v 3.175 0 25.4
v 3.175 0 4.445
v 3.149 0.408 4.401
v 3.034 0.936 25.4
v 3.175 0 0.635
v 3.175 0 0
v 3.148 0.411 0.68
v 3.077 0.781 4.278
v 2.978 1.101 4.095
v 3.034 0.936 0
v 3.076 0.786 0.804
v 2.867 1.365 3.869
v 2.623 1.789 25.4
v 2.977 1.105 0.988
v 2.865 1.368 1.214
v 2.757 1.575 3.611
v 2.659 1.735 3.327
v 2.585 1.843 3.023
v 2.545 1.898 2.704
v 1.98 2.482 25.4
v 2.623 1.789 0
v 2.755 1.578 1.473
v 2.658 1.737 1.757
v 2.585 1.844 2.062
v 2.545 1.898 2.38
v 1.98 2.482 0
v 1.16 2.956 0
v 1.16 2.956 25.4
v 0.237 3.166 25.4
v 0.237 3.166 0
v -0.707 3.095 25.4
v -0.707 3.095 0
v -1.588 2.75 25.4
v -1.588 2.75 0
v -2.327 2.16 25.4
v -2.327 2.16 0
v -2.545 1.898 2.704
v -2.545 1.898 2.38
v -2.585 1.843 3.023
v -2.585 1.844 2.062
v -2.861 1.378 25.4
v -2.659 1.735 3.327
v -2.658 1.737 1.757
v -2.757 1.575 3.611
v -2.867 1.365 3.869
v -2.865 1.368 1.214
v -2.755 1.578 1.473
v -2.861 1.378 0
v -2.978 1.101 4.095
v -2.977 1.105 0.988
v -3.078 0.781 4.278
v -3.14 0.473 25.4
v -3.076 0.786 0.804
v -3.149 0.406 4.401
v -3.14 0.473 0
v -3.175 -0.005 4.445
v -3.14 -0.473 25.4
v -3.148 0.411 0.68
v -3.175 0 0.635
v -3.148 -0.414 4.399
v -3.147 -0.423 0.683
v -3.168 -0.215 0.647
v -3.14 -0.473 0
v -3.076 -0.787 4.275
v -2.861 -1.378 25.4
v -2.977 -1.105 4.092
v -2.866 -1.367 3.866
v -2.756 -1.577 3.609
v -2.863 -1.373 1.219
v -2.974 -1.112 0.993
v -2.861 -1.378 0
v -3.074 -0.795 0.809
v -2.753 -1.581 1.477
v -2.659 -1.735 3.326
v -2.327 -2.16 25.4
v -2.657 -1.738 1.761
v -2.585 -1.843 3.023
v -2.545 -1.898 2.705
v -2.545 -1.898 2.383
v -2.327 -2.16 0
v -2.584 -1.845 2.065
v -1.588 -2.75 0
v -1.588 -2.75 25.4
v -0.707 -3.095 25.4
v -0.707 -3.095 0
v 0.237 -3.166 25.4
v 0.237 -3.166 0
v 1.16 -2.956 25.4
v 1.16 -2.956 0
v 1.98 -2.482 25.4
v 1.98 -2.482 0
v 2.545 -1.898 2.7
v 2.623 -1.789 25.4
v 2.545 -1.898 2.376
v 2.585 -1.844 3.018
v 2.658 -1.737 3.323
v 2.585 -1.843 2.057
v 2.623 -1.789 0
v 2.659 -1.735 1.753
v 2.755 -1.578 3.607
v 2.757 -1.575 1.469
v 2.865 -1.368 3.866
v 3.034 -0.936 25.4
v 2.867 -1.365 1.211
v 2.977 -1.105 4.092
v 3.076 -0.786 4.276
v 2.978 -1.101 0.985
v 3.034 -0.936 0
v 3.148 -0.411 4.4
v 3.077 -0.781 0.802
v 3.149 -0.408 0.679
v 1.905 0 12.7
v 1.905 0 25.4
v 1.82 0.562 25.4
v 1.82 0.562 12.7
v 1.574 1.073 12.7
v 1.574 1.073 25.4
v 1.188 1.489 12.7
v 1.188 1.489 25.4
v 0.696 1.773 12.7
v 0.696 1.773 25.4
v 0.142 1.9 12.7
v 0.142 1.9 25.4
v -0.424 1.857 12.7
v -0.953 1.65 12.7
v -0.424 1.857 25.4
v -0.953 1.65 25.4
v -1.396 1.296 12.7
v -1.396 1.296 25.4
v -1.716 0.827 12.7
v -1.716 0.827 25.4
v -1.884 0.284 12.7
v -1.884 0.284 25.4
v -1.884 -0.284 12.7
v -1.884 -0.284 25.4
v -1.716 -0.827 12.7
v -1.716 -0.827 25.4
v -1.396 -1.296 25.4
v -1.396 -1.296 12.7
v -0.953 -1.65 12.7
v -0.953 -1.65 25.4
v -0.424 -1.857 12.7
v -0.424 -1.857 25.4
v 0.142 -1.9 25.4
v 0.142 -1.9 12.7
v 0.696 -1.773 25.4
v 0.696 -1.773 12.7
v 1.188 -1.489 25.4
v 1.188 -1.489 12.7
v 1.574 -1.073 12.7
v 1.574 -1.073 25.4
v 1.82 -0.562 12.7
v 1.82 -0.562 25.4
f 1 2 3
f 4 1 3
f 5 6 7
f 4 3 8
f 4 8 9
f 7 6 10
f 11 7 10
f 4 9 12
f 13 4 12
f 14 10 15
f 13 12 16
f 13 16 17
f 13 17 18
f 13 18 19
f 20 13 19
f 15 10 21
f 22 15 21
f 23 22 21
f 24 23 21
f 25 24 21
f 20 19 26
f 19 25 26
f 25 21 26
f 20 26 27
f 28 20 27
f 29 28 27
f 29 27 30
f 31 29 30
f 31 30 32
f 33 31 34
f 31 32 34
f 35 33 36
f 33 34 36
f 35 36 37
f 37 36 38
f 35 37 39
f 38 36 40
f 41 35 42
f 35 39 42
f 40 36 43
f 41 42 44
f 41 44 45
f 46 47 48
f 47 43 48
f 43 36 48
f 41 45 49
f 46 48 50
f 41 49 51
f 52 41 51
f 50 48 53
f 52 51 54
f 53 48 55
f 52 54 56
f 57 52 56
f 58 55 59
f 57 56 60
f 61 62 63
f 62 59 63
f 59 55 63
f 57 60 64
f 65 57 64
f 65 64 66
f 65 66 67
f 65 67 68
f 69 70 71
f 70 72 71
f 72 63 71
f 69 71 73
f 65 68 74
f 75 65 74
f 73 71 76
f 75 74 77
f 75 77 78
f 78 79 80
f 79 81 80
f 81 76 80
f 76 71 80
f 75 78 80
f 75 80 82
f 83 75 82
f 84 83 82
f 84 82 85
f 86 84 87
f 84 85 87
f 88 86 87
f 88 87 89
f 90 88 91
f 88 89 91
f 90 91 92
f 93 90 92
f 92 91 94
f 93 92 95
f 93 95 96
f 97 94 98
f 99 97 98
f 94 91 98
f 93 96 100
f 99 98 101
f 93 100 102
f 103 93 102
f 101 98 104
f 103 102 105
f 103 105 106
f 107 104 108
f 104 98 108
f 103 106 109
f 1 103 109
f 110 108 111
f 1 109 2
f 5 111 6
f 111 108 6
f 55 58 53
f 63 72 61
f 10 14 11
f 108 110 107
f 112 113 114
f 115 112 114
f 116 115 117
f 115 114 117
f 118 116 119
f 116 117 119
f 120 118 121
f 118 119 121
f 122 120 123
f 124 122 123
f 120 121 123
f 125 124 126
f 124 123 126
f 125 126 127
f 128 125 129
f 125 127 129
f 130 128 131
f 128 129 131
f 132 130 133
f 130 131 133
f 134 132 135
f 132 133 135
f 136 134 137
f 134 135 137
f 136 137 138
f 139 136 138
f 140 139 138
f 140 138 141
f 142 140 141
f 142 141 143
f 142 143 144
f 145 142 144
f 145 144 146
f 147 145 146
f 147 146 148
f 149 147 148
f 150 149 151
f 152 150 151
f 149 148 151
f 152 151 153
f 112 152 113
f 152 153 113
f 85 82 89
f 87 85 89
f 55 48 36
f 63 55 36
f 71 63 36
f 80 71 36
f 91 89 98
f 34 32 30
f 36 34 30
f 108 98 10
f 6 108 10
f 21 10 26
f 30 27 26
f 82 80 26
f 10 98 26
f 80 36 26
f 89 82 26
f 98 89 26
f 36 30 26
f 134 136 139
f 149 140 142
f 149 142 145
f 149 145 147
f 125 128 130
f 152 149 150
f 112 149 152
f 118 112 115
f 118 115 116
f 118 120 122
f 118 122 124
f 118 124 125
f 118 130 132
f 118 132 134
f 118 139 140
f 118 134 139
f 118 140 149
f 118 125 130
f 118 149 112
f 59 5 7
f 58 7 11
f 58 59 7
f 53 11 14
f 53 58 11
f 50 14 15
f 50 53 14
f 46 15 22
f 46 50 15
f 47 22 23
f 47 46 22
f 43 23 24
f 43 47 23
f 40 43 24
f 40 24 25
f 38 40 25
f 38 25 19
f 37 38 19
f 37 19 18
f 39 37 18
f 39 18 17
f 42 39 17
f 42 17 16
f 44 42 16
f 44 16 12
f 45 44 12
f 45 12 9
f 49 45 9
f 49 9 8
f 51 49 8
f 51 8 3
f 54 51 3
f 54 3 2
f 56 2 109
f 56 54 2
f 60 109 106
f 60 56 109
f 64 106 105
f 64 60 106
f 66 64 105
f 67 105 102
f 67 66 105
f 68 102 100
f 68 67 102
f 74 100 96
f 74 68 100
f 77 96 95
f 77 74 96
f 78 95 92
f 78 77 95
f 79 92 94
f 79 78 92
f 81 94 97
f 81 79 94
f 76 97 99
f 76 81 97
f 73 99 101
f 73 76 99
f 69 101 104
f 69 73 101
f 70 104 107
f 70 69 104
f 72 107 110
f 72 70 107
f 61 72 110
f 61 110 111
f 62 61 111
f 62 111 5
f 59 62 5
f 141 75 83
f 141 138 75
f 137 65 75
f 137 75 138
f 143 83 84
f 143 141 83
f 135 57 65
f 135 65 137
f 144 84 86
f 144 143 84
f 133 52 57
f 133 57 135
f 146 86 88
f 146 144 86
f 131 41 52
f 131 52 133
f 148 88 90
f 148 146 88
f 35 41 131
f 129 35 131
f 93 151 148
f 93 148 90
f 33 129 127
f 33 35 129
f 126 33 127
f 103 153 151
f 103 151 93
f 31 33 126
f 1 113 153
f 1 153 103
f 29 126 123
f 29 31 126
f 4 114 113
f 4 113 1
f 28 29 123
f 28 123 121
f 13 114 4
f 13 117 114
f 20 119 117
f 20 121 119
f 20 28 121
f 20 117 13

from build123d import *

# Parameters (mm, degrees)
SKETCH1_R               = 3.175
BOSS_EXTRUDE1_DEPTH     = 25.4
SKETCH2_R               = 1.905
CUT_EXTRUDE1_DEPTH      = 12.7
CUT_EXTRUDE2_DEPTH      = 26.793821935
CUT_EXTRUDE2_DEPTH_BACK = 26.793821935
SKETCH3_R               = 1.905


with BuildPart() as part:
    # Sketch1 → Boss-Extrude1 (new body)
    with BuildSketch(Plane.XY):
        Circle(SKETCH1_R)
    extrude(amount=BOSS_EXTRUDE1_DEPTH)

    # Sketch2 → Cut-Extrude1 (cut)
    with BuildSketch(Plane.XY.offset(25.4)):
        Circle(SKETCH2_R)
    extrude(amount=-CUT_EXTRUDE1_DEPTH, mode=Mode.SUBTRACT)

    # Sketch3 → Cut-Extrude2 (cut, two sides: drawn at the far end of the back side and taken through both)
    with BuildSketch(Plane(origin=(0, 0, 0), x_dir=(0, 0, -1), z_dir=(1, 0, 0)).offset(-CUT_EXTRUDE2_DEPTH_BACK)):
        with Locations((-2.54, 0)):
            Circle(SKETCH3_R)
    extrude(amount=CUT_EXTRUDE2_DEPTH + CUT_EXTRUDE2_DEPTH_BACK, mode=Mode.SUBTRACT)


solid = part.part
